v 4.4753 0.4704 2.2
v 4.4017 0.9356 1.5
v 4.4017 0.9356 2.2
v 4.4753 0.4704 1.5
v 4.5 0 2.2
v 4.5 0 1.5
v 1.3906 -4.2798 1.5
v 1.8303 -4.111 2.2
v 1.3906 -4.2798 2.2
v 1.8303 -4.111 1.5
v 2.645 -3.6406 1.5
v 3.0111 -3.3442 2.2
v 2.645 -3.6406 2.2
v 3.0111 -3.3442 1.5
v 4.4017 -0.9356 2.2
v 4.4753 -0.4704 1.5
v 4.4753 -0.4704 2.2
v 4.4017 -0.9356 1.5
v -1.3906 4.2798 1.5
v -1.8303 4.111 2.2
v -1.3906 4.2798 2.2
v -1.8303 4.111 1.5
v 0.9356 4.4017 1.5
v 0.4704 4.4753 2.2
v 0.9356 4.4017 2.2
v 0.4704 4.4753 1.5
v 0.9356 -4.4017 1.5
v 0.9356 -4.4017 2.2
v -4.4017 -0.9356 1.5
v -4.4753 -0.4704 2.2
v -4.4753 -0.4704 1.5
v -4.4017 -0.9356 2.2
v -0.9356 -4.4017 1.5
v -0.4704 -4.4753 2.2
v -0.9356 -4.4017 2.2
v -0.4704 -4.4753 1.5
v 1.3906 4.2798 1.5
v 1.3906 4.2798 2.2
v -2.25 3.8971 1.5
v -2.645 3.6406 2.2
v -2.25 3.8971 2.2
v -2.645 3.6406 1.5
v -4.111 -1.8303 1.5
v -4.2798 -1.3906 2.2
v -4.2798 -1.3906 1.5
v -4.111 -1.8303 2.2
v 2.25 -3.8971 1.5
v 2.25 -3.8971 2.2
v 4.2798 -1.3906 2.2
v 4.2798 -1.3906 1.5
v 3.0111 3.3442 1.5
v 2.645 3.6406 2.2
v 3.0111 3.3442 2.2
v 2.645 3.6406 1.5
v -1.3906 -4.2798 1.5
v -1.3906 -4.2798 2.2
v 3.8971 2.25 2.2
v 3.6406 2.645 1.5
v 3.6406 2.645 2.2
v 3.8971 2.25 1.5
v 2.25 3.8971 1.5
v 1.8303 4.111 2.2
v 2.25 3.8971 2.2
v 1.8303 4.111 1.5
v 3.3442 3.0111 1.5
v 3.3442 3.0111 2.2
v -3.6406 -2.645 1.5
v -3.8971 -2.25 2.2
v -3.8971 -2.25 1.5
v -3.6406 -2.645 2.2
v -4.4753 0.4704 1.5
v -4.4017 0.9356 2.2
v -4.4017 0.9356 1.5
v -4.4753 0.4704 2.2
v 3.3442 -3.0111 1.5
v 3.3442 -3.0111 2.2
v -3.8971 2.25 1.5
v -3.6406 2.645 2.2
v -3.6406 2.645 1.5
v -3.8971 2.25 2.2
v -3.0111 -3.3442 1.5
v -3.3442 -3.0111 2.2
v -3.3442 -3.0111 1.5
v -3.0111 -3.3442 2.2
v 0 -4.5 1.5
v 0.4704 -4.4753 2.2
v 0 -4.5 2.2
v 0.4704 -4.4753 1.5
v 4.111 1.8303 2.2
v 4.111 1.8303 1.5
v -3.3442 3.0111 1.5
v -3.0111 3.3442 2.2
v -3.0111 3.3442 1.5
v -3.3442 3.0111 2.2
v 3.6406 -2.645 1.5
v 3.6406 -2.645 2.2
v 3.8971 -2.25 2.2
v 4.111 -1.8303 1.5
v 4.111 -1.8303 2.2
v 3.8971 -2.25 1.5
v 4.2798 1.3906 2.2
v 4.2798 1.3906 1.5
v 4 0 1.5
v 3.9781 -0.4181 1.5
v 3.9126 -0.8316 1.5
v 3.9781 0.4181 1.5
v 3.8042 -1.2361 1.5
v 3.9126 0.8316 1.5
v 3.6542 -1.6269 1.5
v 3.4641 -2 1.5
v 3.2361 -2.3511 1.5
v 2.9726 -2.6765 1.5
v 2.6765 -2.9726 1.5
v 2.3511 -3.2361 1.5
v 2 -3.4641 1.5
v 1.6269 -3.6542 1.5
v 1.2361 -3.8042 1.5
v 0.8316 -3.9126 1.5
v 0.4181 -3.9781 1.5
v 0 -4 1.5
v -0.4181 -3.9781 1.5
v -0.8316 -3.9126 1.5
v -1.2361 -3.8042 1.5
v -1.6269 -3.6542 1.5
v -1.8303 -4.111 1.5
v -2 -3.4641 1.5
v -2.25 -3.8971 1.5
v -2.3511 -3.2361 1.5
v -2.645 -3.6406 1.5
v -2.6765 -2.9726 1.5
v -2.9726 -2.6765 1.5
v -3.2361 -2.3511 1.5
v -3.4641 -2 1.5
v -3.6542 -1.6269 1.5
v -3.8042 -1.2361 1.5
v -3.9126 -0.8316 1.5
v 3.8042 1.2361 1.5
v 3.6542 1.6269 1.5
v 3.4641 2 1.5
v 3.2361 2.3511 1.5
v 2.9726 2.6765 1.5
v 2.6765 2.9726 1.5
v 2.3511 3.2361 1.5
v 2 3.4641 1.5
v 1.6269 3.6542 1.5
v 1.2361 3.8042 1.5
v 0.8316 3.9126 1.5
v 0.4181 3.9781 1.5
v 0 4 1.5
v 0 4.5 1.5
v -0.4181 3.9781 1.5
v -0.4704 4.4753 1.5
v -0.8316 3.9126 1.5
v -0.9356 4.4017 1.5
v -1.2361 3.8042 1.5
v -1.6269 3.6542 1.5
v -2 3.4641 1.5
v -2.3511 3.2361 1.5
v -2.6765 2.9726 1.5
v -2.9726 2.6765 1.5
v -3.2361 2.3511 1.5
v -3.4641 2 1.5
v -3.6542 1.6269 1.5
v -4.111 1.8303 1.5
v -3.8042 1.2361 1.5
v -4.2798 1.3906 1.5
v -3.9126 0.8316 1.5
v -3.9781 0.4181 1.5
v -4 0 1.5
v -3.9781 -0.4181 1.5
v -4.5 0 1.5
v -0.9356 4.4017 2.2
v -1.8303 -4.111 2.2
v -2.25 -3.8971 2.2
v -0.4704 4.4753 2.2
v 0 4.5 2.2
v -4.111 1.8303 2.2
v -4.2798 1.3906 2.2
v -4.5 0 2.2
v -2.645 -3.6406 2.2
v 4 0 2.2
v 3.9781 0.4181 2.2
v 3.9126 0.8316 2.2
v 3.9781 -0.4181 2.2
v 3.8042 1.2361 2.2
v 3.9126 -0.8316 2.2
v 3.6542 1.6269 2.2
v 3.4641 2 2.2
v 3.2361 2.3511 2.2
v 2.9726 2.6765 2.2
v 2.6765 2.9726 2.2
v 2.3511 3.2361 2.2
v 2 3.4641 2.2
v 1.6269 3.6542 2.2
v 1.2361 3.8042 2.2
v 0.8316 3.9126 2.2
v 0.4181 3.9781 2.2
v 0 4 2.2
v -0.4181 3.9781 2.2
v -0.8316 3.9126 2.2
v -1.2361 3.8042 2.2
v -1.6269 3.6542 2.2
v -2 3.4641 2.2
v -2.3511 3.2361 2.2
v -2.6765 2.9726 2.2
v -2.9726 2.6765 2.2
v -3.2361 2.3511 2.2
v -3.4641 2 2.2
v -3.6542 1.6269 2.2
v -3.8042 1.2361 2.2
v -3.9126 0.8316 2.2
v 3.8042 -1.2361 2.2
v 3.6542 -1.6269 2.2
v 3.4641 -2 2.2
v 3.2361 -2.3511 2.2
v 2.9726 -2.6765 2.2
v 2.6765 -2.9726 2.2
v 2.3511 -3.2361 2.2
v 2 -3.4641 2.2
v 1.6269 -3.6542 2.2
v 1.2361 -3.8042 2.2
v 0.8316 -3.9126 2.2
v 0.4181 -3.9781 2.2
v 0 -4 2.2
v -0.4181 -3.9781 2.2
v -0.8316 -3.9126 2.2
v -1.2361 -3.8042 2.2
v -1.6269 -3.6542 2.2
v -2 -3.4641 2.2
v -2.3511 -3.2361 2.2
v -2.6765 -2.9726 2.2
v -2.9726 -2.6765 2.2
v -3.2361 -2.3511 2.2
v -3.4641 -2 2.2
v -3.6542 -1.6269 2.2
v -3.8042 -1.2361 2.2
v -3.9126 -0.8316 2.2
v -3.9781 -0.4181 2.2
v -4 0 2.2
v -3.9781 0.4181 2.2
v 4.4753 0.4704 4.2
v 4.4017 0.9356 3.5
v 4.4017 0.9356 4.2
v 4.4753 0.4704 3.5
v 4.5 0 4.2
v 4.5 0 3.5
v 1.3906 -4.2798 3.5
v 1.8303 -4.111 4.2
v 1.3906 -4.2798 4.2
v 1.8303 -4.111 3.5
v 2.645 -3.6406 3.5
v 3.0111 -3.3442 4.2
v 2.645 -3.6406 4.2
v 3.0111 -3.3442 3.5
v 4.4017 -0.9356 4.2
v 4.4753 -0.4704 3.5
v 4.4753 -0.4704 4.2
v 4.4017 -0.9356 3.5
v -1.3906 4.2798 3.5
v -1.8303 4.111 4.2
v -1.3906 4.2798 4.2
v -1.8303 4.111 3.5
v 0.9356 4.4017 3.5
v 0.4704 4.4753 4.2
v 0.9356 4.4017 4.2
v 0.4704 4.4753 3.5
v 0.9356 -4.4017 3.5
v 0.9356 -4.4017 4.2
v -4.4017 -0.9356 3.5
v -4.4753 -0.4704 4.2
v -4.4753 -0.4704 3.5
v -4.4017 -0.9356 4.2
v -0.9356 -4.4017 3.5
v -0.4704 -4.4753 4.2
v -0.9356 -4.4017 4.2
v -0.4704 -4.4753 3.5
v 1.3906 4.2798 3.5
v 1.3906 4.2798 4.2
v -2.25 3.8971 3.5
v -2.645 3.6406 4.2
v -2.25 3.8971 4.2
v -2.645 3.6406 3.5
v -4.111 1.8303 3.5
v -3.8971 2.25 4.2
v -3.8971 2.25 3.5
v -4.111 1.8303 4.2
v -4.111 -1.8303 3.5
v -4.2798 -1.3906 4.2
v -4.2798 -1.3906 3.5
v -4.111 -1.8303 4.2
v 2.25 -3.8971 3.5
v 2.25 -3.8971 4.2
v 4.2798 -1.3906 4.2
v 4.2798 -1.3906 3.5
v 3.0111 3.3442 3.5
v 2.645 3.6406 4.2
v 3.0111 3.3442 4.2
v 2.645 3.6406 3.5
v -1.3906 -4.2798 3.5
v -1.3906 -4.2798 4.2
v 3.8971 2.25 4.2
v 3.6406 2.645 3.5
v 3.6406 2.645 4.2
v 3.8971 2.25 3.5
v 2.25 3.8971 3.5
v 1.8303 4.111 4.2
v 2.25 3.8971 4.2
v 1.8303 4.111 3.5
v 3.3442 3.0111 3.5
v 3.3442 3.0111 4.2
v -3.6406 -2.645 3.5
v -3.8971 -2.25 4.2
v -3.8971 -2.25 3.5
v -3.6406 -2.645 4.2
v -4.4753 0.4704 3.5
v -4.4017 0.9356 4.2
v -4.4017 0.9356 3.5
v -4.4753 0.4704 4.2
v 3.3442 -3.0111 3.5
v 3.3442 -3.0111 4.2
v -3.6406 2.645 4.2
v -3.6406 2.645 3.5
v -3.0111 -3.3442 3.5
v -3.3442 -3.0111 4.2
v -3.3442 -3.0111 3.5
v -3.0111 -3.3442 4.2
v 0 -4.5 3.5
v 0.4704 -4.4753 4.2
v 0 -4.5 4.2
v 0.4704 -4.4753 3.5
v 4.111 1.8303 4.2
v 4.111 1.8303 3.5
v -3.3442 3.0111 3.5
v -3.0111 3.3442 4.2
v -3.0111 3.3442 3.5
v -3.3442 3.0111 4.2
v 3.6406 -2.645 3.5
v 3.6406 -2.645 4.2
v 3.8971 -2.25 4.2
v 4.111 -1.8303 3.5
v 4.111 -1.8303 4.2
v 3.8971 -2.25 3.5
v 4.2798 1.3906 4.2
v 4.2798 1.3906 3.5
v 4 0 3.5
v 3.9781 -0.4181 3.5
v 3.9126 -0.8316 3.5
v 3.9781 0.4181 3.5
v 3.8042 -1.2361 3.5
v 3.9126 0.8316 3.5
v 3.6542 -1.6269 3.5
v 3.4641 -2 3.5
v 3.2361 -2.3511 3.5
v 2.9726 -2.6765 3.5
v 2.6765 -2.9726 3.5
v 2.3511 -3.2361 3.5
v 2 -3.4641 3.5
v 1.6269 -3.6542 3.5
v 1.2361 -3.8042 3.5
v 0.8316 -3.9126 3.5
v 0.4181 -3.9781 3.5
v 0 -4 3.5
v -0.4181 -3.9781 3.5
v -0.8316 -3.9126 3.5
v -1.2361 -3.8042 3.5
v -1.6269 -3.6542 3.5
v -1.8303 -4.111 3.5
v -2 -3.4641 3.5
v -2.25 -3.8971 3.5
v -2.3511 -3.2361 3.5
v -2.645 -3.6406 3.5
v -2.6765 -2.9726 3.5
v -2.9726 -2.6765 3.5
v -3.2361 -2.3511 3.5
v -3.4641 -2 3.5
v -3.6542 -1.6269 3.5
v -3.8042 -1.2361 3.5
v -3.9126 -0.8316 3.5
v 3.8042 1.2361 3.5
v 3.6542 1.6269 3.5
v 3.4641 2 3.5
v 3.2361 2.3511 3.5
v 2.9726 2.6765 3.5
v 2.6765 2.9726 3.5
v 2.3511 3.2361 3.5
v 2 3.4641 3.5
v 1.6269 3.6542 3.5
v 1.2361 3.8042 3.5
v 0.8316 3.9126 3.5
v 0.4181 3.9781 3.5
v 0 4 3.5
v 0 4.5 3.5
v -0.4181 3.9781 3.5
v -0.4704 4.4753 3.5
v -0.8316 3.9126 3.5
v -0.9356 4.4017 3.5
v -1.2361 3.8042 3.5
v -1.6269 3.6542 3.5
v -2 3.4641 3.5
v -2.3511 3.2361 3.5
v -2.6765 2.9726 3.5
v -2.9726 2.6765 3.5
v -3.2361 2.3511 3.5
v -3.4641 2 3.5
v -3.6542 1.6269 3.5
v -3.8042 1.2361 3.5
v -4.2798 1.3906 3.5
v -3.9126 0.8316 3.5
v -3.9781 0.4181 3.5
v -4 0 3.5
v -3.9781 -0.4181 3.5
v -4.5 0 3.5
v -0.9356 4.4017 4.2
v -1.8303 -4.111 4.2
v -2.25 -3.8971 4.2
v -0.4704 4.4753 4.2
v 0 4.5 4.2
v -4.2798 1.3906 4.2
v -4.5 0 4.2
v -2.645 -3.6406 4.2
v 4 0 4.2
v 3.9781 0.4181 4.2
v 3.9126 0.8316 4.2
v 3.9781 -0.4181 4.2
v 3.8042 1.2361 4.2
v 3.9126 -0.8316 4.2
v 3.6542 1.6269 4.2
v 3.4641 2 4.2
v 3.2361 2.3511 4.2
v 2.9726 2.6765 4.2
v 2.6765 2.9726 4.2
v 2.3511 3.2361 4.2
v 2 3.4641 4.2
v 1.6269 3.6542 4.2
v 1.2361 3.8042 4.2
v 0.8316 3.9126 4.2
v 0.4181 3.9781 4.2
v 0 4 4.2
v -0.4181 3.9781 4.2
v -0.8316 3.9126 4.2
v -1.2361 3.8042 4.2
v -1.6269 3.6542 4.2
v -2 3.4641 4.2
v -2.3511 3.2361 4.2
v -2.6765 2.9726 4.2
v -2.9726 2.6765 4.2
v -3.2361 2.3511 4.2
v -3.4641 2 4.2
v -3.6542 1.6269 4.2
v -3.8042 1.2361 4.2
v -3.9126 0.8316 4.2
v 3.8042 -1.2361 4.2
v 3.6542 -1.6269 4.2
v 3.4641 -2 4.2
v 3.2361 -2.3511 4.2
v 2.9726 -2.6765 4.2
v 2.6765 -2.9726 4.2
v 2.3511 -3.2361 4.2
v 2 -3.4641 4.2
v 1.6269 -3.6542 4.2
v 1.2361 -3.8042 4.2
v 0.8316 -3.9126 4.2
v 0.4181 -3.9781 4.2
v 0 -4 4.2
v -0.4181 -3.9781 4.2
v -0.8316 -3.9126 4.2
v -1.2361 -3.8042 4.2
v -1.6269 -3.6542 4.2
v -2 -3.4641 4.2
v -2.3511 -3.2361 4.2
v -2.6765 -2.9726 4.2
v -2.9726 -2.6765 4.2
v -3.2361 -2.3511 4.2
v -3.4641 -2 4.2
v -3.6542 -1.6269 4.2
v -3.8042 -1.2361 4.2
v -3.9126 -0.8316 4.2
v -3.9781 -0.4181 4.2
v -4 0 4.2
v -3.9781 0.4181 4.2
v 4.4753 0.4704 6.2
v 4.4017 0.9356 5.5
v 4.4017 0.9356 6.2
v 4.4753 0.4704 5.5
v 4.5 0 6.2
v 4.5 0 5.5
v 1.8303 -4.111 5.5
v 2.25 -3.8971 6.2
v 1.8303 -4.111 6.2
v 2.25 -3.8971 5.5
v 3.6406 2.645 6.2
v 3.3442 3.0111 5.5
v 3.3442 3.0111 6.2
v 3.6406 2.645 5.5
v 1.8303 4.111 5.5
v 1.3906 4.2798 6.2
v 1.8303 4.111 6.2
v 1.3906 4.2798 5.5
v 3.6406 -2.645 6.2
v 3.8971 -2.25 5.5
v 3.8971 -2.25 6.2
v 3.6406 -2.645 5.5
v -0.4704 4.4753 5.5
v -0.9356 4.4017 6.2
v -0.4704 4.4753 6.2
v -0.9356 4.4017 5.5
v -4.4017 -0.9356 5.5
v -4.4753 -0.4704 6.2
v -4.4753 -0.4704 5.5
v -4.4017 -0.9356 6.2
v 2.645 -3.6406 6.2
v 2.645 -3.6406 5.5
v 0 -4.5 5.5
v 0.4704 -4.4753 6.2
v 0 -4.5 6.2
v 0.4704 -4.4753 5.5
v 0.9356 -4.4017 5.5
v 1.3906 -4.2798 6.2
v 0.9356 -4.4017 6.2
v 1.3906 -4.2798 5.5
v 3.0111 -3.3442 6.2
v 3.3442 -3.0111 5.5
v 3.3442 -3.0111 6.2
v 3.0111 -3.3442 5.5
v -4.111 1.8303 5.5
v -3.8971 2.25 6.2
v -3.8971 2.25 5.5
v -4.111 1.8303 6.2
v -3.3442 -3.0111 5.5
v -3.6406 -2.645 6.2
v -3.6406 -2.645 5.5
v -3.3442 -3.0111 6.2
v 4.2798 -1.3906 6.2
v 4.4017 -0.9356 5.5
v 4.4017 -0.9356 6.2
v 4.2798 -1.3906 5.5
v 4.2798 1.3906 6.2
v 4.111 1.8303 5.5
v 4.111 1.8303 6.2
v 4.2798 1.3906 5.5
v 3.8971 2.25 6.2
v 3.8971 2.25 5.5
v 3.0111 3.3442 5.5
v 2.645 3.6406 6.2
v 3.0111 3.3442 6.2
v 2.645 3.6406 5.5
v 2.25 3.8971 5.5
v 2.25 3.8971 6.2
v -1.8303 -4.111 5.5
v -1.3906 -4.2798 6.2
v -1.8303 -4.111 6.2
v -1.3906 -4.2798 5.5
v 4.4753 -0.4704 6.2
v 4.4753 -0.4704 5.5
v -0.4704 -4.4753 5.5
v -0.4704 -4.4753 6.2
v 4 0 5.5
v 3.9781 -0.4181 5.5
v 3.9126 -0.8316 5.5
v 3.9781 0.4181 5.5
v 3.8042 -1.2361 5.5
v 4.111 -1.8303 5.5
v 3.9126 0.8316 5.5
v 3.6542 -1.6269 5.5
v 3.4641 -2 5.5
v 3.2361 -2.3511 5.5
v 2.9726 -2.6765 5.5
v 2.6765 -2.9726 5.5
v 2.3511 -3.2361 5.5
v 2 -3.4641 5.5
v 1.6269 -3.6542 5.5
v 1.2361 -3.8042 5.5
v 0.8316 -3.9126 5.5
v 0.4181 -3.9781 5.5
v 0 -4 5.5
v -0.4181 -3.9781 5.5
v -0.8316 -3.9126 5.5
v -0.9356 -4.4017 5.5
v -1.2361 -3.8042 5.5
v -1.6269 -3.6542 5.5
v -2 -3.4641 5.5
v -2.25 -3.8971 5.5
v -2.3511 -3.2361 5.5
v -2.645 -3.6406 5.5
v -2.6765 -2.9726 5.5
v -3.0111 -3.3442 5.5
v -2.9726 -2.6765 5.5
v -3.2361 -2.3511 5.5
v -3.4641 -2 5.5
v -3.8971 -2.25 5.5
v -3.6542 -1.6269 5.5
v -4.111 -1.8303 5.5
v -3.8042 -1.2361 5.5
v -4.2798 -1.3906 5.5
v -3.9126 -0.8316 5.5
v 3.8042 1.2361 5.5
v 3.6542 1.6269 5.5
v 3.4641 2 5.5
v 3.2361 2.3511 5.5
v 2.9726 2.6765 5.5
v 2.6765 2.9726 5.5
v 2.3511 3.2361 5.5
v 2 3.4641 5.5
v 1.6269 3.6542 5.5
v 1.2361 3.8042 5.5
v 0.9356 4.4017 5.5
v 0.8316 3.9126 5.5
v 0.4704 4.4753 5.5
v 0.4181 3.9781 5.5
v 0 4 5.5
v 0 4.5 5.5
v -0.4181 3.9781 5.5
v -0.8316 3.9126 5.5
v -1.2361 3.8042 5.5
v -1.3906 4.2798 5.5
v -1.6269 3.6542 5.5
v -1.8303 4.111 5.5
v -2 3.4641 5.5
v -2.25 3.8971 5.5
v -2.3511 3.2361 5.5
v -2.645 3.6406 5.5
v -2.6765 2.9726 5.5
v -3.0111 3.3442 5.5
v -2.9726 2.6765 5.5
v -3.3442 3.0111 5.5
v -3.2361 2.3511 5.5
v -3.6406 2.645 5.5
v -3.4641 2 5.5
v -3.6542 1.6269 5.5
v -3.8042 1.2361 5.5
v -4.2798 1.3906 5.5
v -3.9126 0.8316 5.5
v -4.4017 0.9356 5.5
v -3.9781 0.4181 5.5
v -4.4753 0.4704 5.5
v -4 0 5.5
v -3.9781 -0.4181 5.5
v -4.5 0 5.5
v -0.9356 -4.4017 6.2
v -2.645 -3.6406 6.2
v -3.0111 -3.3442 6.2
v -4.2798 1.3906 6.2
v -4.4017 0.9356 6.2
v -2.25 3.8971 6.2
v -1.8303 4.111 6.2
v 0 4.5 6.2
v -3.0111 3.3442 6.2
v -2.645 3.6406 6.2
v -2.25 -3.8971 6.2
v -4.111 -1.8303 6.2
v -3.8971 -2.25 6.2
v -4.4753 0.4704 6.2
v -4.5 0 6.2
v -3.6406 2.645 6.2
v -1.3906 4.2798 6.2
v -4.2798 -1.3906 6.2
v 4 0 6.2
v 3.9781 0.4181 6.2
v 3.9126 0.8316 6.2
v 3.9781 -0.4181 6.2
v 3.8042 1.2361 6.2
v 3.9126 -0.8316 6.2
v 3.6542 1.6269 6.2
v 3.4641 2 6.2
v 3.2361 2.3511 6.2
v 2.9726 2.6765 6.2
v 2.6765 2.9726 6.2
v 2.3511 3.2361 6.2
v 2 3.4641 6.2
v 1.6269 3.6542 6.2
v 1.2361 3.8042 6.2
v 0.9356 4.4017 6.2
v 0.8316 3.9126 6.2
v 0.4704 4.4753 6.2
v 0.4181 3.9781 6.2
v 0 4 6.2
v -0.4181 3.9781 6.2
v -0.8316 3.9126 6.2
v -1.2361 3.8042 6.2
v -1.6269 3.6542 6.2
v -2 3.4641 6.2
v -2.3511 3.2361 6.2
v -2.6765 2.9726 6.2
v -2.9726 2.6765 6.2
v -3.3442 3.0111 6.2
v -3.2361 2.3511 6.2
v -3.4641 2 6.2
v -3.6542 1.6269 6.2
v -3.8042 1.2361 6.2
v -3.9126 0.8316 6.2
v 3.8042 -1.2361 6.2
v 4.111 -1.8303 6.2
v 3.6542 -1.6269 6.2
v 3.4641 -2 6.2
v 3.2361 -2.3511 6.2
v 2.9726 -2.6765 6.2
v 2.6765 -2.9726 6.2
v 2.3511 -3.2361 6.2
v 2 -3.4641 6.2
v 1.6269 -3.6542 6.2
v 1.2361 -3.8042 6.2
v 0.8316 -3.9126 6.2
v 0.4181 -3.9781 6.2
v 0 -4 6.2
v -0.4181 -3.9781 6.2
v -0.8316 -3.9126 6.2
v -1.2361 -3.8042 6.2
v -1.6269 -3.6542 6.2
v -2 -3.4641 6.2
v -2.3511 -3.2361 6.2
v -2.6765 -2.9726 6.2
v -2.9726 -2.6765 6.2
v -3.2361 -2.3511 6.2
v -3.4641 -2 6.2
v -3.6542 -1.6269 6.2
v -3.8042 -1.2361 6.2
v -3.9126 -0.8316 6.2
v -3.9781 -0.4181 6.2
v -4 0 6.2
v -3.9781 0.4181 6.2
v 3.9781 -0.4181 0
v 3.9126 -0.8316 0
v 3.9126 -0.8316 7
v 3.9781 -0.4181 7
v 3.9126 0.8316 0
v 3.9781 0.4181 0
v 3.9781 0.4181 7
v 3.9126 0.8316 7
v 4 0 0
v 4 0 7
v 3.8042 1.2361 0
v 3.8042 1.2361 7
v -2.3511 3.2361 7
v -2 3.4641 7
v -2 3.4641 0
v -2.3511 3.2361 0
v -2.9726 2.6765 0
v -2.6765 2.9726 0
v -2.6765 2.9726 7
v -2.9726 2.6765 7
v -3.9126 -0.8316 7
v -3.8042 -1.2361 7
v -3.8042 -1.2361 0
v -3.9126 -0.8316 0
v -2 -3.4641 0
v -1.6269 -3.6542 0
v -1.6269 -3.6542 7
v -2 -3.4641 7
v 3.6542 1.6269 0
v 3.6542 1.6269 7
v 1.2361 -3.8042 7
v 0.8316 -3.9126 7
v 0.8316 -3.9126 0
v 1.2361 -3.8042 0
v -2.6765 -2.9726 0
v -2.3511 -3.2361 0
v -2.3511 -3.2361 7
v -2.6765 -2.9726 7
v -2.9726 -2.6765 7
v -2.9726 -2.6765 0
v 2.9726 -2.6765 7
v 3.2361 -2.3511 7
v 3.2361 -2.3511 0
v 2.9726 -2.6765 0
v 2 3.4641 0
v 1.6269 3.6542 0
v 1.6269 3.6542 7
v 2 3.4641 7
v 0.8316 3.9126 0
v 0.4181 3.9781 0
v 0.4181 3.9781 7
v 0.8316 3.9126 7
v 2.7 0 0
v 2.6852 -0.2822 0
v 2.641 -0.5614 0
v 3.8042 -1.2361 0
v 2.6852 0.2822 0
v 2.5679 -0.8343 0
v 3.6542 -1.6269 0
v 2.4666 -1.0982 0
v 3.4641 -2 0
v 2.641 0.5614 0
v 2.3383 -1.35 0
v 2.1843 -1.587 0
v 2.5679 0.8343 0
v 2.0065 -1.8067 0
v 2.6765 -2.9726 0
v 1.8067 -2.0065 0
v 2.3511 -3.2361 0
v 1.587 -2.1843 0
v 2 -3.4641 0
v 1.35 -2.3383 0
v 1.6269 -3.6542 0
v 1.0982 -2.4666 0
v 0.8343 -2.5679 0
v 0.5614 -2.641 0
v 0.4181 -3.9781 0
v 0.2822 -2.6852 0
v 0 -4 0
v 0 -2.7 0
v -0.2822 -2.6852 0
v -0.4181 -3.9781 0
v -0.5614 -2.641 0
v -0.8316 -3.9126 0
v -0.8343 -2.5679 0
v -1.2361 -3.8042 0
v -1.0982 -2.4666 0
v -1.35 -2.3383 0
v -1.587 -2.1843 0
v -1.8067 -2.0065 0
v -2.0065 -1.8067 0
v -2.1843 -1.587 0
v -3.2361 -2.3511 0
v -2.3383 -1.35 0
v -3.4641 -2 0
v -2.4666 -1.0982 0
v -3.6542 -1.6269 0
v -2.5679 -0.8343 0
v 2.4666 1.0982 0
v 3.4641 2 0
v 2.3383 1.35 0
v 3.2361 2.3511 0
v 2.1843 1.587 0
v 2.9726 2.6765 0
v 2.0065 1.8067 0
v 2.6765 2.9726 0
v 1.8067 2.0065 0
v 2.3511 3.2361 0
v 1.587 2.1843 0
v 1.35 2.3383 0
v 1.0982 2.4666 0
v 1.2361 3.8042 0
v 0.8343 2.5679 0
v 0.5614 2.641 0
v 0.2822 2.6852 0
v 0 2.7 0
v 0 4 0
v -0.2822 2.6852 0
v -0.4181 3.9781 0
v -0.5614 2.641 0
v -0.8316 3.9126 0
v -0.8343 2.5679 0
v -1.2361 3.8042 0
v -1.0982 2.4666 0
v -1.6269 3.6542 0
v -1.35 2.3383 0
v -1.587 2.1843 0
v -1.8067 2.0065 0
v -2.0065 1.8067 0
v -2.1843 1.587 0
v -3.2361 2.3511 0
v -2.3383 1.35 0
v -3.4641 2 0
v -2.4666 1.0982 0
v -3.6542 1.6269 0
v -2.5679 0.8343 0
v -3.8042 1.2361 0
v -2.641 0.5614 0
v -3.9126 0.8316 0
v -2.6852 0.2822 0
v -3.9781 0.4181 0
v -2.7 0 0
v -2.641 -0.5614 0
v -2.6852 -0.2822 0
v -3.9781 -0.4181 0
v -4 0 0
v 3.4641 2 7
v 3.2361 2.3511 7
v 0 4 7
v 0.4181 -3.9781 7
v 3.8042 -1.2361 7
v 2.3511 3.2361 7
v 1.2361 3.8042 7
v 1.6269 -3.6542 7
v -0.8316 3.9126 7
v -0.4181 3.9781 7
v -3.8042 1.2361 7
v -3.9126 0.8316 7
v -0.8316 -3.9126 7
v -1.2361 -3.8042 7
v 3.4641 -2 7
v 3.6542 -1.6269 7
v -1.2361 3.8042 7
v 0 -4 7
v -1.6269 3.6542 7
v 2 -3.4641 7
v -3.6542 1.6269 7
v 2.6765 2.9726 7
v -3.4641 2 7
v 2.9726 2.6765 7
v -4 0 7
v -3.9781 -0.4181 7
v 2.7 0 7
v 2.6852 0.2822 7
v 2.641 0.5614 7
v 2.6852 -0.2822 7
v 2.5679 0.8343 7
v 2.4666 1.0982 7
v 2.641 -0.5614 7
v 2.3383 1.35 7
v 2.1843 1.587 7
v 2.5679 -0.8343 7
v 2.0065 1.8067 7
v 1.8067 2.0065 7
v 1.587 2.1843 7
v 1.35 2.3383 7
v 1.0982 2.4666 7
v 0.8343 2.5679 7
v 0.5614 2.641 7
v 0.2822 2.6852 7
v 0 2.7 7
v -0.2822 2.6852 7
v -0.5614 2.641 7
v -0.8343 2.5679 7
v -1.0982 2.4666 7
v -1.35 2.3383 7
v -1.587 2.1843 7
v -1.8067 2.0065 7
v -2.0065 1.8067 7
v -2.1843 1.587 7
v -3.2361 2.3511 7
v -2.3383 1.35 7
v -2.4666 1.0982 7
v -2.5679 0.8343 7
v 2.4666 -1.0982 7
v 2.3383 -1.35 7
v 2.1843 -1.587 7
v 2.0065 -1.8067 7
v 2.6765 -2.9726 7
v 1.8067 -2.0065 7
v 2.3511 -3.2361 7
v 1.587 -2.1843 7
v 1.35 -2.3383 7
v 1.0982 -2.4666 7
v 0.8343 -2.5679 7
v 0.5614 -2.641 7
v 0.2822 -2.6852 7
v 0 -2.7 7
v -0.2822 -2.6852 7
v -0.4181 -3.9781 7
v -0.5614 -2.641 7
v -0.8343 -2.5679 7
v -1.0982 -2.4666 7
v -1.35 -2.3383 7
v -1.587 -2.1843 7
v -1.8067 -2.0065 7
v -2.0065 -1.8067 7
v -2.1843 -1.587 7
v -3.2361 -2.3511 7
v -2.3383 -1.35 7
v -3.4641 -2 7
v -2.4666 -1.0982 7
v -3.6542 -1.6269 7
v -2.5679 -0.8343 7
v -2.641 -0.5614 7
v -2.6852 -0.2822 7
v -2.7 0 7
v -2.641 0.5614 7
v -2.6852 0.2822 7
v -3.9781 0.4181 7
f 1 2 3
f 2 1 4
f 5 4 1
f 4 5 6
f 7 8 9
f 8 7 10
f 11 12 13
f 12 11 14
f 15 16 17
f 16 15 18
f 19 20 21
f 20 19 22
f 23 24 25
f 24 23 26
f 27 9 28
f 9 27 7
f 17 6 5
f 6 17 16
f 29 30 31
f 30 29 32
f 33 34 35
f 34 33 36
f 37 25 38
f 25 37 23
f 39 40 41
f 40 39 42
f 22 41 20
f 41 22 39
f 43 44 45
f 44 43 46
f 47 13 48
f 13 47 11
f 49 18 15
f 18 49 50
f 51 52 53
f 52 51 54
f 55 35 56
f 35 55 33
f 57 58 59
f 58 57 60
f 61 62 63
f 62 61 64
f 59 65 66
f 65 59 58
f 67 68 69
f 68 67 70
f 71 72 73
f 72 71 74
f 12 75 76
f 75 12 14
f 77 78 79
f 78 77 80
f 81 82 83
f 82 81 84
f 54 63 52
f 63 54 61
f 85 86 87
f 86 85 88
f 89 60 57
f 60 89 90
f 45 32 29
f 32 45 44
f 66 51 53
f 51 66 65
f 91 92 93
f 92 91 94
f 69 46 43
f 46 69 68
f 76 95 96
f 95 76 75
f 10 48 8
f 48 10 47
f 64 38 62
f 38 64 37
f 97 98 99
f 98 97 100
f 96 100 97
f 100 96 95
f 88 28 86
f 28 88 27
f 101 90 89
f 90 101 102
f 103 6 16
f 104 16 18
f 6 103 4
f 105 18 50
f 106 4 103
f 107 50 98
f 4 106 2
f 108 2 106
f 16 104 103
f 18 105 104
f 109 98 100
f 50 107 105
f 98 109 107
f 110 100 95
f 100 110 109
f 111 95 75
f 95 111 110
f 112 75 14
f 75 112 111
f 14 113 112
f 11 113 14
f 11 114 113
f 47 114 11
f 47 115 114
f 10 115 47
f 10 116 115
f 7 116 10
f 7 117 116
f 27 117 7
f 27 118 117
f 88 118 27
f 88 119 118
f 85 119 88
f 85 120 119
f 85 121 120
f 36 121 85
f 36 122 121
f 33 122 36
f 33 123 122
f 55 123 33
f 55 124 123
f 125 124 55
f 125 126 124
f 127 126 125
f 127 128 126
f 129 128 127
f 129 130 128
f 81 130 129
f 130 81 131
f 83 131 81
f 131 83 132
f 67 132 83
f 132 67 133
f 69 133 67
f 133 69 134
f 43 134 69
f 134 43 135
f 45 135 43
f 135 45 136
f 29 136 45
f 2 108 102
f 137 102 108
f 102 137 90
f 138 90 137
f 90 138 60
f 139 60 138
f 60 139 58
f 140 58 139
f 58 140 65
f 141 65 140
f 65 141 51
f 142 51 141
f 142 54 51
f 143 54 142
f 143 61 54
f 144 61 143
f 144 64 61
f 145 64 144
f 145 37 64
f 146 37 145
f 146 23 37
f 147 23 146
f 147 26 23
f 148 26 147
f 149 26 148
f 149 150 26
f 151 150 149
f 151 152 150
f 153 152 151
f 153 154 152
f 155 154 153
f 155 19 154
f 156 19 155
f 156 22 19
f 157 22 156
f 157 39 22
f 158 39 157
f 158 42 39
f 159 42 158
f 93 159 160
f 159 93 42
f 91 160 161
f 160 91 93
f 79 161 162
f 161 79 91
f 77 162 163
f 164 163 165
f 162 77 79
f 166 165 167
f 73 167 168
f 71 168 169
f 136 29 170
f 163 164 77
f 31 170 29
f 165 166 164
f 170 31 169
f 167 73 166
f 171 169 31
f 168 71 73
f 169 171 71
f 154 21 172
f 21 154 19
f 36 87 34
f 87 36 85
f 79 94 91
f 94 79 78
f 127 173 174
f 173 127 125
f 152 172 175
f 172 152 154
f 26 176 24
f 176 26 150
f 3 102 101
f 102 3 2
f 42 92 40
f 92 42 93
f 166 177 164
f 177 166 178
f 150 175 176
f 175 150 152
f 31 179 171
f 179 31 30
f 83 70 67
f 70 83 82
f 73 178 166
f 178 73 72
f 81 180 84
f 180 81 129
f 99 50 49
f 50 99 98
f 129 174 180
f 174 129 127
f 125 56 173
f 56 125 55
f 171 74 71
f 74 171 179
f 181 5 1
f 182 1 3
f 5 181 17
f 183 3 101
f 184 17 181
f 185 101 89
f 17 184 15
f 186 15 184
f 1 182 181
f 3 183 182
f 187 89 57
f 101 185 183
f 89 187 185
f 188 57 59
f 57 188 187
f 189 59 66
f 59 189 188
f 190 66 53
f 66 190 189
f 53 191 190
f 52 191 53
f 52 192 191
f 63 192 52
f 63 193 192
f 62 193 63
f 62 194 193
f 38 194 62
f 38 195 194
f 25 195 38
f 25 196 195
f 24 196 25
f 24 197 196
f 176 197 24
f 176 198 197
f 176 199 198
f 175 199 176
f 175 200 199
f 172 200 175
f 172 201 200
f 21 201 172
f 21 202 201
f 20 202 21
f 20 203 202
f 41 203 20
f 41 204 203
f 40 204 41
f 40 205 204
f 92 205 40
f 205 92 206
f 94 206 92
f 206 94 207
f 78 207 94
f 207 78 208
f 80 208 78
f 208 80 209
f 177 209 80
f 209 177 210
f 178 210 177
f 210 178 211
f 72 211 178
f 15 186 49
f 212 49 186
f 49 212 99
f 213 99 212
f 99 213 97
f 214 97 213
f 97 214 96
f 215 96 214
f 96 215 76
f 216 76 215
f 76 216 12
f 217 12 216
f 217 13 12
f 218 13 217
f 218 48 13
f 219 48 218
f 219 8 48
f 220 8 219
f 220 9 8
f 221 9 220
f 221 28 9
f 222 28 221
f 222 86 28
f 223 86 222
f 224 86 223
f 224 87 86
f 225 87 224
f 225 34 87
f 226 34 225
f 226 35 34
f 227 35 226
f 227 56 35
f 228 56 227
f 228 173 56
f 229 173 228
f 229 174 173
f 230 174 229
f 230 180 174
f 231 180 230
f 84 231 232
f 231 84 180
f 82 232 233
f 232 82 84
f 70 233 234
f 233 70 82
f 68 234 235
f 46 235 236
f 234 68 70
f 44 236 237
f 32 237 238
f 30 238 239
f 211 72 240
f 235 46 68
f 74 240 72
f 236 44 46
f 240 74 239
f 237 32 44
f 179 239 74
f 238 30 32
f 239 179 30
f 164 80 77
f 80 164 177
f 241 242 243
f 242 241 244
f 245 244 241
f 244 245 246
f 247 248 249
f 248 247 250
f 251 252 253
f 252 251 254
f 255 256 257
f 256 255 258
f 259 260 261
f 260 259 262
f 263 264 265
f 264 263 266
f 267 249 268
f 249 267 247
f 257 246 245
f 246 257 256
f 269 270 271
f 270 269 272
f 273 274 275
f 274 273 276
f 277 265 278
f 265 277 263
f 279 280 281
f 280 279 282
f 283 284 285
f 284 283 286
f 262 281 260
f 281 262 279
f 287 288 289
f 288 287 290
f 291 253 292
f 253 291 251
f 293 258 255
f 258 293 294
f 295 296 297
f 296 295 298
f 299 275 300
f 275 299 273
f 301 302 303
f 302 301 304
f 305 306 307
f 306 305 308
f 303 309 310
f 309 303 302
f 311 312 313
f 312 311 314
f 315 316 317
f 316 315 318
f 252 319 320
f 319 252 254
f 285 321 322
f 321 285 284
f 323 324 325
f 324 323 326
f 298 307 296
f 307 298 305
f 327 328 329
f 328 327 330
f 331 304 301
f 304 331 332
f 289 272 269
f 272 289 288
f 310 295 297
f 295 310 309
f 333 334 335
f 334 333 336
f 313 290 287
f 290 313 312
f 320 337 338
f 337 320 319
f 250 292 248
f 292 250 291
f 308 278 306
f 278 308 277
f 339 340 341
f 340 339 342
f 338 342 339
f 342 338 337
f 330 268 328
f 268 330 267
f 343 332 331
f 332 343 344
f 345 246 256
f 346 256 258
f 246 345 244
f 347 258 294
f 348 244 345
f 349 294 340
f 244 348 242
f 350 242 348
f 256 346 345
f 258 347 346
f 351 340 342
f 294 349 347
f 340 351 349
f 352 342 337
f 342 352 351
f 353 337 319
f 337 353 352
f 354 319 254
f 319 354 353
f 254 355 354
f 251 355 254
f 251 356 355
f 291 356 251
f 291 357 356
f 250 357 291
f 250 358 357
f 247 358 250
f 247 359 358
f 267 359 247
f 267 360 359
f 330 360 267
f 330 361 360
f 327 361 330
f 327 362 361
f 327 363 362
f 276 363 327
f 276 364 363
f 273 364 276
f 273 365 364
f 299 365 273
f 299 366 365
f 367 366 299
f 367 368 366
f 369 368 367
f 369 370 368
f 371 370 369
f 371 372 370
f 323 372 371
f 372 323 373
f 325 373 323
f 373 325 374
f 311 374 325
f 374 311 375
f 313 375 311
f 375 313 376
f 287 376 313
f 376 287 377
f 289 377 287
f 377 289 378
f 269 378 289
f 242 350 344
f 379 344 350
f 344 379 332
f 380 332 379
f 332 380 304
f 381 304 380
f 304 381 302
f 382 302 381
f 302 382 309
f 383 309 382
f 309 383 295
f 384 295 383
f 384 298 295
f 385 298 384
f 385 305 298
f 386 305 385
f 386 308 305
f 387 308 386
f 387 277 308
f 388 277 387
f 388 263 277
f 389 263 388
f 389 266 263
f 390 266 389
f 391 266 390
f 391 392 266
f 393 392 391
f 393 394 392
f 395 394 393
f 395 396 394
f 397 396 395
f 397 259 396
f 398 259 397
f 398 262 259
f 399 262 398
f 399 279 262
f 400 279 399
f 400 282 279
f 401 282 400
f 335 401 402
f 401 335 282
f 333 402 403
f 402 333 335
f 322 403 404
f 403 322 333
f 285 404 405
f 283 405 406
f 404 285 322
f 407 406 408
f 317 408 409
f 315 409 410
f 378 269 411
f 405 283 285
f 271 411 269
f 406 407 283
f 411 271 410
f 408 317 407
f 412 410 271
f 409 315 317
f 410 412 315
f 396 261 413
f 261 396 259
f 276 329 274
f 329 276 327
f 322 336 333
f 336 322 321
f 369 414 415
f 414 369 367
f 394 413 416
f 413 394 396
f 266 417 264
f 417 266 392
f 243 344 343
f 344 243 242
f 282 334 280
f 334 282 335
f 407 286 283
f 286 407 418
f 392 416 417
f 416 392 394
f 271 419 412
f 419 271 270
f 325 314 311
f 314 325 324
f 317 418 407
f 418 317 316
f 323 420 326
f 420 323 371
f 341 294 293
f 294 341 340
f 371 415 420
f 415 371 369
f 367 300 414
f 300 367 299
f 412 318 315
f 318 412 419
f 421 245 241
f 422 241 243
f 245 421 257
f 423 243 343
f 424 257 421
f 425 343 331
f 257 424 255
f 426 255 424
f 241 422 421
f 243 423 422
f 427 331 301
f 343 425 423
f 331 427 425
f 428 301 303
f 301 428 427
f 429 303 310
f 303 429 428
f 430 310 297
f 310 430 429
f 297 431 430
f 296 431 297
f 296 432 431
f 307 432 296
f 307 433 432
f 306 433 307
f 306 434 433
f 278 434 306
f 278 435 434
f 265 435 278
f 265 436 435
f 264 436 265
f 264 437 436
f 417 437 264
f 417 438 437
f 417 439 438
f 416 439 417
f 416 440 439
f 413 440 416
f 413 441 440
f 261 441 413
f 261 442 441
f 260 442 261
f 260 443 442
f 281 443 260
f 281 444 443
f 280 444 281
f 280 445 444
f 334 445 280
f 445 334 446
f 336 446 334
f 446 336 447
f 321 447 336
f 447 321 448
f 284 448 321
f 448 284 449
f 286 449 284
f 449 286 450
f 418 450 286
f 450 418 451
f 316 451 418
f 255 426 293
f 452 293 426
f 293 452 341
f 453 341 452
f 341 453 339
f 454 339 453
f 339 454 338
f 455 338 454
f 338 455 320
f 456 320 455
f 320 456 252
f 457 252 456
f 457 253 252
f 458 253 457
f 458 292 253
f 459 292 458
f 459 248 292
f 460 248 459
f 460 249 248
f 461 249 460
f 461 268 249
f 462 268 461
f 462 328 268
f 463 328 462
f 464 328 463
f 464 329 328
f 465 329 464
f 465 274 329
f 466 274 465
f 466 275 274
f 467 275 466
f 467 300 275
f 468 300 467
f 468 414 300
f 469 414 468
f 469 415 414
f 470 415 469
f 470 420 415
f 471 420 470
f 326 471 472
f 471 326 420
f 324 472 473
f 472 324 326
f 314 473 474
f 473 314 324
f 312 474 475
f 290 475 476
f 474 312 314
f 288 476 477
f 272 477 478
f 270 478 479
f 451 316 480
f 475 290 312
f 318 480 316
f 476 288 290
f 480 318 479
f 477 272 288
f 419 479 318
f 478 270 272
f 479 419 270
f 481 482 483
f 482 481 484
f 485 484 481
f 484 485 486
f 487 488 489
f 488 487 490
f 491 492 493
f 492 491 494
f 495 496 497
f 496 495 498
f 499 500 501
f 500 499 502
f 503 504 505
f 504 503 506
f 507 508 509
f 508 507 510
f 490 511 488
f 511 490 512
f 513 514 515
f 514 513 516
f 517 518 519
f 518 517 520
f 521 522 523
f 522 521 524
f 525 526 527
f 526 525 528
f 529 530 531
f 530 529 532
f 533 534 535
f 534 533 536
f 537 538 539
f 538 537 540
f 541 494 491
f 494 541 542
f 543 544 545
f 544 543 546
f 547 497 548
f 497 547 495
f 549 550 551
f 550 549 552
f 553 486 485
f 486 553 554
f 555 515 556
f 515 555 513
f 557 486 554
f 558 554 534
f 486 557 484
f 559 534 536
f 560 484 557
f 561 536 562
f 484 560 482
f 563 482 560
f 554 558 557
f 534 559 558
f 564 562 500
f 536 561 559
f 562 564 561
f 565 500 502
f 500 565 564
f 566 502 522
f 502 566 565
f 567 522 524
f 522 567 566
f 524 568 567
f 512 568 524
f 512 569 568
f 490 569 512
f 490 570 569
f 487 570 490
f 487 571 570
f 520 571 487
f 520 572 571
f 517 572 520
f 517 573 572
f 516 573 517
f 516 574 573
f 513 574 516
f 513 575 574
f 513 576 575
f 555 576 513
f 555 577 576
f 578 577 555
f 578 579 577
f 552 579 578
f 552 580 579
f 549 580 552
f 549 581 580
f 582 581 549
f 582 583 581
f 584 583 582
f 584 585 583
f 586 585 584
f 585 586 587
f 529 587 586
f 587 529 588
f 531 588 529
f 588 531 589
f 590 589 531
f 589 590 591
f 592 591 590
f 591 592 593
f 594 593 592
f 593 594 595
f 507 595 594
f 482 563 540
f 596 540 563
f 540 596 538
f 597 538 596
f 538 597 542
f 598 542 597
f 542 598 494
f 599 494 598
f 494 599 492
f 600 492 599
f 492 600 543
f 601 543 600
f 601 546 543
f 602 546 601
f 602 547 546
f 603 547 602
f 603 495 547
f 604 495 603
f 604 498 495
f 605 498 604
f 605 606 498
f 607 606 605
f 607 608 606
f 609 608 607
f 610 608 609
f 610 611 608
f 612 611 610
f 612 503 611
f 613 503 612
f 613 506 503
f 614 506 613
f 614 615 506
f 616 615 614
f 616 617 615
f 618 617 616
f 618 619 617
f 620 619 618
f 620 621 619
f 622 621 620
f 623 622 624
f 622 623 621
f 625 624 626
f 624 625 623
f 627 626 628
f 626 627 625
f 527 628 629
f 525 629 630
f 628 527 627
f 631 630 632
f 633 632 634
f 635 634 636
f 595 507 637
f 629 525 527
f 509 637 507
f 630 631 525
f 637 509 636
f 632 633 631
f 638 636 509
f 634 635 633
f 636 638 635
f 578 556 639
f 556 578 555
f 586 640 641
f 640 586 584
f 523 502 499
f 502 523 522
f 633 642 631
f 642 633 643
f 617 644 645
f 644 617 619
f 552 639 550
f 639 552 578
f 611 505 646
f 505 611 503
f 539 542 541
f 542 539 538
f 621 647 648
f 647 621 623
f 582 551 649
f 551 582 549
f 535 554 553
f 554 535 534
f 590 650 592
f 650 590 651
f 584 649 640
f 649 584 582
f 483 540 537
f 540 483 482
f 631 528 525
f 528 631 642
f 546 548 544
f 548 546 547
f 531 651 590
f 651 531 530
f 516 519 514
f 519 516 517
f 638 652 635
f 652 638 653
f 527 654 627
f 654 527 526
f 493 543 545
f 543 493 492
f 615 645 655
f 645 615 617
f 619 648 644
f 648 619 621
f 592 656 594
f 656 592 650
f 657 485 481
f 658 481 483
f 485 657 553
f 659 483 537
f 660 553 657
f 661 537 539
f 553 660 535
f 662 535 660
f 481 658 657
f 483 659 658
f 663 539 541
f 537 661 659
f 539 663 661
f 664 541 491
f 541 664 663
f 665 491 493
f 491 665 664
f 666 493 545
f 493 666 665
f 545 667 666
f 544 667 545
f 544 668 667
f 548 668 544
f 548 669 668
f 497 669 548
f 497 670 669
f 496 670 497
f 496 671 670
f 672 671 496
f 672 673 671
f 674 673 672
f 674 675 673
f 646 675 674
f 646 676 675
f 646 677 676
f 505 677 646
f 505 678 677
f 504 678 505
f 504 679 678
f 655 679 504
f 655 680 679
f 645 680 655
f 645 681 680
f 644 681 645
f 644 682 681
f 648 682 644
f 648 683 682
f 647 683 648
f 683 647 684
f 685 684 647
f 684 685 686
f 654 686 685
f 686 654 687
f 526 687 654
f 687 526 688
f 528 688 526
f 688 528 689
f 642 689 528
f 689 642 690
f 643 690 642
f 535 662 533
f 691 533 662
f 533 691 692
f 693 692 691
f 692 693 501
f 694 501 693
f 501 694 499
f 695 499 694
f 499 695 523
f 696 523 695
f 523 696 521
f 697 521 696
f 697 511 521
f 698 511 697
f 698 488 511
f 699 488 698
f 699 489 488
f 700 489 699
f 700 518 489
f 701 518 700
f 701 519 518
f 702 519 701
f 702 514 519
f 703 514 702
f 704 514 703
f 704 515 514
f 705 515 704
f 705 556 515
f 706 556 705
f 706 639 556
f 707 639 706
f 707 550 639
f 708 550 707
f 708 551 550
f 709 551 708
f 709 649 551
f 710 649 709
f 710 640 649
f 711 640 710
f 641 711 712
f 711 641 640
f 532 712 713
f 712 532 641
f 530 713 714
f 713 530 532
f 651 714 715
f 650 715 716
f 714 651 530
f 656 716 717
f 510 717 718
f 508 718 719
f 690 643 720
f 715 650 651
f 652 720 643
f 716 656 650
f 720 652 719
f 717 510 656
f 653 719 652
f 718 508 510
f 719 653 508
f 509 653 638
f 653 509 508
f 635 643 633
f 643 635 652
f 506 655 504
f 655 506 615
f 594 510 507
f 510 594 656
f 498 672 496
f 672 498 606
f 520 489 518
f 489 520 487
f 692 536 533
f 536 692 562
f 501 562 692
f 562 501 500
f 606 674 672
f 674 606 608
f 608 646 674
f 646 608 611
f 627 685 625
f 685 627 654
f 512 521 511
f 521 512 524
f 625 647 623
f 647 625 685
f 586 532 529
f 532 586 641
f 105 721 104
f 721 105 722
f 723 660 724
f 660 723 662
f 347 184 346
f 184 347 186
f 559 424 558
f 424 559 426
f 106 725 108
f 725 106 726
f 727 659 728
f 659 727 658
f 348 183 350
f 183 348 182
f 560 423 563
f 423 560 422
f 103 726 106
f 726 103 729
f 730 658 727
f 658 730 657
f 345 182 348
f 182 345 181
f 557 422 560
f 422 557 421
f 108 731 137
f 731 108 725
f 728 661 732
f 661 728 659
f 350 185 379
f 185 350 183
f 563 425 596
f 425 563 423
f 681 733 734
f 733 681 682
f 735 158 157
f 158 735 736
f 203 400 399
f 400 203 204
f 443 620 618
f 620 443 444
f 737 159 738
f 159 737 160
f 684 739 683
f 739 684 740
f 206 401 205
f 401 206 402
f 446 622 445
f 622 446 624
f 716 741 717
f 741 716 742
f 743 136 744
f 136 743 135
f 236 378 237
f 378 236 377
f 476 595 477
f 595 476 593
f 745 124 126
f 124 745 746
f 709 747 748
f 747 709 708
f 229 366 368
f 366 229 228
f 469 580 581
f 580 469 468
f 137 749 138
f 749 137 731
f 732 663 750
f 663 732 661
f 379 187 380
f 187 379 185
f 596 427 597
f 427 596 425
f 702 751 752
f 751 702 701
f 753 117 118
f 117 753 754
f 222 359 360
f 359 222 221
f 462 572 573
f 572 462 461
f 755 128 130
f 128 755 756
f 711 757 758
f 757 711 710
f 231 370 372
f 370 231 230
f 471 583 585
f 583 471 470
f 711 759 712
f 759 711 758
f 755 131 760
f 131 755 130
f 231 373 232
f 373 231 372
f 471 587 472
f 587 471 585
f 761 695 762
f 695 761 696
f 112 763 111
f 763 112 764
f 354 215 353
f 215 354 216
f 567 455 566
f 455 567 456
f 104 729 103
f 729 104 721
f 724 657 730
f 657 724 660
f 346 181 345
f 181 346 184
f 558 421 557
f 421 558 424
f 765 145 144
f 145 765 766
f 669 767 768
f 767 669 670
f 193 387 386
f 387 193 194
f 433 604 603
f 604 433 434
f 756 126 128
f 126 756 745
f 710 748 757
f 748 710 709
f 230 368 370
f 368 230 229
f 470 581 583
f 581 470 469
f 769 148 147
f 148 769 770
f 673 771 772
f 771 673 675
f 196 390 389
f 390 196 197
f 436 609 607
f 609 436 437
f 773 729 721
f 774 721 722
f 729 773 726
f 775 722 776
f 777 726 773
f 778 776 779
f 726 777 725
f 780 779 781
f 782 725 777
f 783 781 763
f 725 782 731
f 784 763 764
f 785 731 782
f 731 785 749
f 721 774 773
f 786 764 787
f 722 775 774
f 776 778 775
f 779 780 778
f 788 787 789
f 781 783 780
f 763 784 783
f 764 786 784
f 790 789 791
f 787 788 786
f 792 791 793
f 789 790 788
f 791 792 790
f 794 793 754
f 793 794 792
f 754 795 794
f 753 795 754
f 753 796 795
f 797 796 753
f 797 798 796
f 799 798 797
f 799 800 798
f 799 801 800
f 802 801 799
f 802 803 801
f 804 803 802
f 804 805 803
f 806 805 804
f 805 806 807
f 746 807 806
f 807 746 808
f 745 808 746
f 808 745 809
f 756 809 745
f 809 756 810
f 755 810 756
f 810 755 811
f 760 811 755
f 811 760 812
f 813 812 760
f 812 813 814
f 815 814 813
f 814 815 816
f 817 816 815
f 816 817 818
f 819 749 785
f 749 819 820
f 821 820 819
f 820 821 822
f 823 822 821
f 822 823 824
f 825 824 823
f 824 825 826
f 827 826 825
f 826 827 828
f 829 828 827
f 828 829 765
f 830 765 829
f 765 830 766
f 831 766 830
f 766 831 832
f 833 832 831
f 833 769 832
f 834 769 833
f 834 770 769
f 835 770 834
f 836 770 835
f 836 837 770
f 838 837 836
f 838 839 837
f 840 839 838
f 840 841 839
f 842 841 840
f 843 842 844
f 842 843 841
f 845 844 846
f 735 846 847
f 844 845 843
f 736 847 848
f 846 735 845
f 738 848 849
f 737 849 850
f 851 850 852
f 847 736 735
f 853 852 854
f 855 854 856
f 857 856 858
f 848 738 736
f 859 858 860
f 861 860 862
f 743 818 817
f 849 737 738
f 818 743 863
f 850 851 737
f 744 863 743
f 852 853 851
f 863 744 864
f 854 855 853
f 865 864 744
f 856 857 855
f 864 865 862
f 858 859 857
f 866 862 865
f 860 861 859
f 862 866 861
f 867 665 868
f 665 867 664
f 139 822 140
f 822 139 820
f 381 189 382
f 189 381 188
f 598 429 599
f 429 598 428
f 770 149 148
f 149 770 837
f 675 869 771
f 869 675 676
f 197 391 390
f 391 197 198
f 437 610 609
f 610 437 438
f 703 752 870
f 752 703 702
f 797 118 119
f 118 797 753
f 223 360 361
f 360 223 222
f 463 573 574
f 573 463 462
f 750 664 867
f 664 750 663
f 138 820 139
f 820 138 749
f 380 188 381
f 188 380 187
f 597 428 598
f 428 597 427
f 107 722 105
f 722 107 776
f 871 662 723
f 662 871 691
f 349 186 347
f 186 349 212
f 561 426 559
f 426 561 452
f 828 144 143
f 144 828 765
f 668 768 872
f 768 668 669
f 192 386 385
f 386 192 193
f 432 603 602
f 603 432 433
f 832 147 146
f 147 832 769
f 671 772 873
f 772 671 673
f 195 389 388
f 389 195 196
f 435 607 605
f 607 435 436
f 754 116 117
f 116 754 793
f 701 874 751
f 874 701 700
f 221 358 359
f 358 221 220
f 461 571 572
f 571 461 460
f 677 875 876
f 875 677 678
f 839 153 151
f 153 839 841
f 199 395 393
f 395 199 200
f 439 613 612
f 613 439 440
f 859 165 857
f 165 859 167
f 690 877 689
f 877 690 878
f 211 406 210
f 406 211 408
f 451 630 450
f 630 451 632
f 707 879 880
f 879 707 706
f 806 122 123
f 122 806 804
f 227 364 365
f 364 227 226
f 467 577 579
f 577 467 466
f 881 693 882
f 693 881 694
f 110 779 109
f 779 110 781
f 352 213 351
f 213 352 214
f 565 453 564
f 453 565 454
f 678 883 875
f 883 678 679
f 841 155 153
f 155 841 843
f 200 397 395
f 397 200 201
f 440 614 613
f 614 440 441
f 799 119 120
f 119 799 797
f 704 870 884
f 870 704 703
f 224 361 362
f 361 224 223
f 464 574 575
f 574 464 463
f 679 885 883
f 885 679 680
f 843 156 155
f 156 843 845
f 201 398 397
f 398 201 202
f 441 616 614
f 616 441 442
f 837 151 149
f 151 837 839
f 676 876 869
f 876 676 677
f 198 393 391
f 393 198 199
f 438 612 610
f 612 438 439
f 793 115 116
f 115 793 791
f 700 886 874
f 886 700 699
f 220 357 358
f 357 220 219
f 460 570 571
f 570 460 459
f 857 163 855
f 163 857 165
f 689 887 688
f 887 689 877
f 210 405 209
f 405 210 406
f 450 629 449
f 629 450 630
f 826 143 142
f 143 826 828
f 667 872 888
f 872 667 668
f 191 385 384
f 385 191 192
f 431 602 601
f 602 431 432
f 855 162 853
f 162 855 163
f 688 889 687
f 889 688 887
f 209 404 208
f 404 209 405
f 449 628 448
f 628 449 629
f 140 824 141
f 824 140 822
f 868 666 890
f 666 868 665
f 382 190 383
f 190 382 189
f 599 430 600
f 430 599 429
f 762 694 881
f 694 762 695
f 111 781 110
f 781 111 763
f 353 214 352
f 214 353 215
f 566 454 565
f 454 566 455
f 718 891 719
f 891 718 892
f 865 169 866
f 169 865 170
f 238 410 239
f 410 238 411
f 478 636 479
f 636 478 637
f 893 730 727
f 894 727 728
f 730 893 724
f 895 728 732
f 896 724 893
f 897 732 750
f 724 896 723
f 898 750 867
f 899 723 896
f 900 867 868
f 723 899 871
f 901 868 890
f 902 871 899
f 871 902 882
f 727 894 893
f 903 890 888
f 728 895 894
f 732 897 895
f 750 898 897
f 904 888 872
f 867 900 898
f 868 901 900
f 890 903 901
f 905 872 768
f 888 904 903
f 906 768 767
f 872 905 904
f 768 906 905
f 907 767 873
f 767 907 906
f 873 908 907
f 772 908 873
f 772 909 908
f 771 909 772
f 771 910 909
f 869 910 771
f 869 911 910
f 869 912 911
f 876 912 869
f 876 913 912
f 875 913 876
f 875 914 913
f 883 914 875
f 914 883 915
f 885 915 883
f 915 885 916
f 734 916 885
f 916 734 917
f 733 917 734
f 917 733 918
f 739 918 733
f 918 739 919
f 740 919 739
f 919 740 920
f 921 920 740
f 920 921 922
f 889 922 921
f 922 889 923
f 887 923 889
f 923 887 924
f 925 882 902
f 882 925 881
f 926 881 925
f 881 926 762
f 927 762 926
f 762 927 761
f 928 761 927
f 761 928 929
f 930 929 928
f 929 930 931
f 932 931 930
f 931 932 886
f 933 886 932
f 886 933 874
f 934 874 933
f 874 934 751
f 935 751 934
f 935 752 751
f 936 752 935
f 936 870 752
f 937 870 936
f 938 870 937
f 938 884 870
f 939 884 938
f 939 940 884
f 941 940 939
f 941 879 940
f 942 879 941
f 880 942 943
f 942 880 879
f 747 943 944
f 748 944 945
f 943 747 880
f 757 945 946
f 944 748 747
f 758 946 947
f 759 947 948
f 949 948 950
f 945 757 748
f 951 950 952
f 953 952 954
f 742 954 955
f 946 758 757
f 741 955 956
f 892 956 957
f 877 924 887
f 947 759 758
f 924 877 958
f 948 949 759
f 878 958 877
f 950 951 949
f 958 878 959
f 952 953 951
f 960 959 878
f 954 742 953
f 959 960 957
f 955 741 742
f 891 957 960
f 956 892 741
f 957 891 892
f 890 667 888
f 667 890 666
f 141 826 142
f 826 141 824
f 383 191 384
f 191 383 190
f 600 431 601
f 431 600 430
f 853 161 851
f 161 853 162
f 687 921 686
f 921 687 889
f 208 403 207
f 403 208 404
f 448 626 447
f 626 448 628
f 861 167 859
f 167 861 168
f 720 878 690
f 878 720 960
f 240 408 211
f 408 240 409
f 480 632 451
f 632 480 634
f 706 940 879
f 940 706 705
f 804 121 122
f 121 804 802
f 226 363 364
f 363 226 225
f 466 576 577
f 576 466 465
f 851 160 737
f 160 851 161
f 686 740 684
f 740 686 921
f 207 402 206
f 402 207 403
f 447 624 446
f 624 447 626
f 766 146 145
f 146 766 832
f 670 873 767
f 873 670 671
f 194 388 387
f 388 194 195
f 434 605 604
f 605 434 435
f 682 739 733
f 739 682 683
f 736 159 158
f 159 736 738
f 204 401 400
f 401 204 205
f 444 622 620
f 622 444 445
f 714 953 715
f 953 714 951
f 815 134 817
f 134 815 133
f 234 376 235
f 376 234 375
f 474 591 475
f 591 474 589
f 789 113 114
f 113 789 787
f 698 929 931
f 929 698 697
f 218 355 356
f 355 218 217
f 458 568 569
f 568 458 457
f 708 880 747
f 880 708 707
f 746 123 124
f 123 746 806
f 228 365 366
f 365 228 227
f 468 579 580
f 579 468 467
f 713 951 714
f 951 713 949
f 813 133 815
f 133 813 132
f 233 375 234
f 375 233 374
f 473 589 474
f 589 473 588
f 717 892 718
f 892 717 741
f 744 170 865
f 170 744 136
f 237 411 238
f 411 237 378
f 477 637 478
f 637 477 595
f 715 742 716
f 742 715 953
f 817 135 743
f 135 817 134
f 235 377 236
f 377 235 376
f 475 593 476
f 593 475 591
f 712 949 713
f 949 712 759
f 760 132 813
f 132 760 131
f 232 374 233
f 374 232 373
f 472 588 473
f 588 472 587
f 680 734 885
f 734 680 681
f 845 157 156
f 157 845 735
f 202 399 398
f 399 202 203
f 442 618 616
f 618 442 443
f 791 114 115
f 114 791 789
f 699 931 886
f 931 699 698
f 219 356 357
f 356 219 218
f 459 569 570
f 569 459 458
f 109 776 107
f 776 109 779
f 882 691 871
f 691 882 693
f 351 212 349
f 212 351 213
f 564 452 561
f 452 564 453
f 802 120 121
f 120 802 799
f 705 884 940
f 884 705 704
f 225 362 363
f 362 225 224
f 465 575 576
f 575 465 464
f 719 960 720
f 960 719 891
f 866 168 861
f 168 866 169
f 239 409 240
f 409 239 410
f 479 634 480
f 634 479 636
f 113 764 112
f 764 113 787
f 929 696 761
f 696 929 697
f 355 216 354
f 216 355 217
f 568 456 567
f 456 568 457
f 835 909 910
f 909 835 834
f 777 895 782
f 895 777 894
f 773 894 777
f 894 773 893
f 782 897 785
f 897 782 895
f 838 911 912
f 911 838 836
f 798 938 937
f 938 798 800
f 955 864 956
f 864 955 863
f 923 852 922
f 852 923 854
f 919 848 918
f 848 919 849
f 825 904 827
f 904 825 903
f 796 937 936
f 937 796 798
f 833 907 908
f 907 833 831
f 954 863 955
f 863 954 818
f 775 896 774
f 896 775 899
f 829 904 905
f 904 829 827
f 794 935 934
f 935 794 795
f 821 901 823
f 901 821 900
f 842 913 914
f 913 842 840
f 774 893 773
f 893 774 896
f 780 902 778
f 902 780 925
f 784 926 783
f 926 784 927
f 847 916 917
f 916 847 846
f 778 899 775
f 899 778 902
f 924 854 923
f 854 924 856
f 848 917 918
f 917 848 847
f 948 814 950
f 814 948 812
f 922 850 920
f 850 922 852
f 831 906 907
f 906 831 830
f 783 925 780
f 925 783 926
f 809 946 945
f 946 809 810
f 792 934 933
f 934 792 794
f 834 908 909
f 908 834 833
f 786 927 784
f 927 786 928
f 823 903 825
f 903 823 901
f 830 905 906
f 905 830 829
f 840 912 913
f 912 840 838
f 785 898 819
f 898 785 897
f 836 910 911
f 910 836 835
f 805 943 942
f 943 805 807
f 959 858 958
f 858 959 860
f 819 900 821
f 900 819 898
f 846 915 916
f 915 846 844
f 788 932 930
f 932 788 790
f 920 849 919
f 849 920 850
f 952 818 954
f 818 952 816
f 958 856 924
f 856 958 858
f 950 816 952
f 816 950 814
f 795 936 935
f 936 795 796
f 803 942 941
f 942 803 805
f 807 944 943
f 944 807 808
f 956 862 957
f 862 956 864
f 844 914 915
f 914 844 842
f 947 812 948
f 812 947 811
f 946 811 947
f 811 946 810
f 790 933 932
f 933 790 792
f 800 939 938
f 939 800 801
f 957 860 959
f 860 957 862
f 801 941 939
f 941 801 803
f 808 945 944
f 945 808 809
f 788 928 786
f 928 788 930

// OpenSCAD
// Heat-set insert, simplified ribbed geometry.
$fn = 60;
eps = 0.02;
inner_d = 5.4;
outer_d = 8;
length = 7;
difference() {
    union() {
        cylinder(d=outer_d,h=length);
        for(z=[1.5:2:length-1]) translate([0,0,z]) cylinder(d=outer_d+1,h=0.7);
    }
    translate([0,0,-eps]) cylinder(d=inner_d,h=length+2*eps);
}
